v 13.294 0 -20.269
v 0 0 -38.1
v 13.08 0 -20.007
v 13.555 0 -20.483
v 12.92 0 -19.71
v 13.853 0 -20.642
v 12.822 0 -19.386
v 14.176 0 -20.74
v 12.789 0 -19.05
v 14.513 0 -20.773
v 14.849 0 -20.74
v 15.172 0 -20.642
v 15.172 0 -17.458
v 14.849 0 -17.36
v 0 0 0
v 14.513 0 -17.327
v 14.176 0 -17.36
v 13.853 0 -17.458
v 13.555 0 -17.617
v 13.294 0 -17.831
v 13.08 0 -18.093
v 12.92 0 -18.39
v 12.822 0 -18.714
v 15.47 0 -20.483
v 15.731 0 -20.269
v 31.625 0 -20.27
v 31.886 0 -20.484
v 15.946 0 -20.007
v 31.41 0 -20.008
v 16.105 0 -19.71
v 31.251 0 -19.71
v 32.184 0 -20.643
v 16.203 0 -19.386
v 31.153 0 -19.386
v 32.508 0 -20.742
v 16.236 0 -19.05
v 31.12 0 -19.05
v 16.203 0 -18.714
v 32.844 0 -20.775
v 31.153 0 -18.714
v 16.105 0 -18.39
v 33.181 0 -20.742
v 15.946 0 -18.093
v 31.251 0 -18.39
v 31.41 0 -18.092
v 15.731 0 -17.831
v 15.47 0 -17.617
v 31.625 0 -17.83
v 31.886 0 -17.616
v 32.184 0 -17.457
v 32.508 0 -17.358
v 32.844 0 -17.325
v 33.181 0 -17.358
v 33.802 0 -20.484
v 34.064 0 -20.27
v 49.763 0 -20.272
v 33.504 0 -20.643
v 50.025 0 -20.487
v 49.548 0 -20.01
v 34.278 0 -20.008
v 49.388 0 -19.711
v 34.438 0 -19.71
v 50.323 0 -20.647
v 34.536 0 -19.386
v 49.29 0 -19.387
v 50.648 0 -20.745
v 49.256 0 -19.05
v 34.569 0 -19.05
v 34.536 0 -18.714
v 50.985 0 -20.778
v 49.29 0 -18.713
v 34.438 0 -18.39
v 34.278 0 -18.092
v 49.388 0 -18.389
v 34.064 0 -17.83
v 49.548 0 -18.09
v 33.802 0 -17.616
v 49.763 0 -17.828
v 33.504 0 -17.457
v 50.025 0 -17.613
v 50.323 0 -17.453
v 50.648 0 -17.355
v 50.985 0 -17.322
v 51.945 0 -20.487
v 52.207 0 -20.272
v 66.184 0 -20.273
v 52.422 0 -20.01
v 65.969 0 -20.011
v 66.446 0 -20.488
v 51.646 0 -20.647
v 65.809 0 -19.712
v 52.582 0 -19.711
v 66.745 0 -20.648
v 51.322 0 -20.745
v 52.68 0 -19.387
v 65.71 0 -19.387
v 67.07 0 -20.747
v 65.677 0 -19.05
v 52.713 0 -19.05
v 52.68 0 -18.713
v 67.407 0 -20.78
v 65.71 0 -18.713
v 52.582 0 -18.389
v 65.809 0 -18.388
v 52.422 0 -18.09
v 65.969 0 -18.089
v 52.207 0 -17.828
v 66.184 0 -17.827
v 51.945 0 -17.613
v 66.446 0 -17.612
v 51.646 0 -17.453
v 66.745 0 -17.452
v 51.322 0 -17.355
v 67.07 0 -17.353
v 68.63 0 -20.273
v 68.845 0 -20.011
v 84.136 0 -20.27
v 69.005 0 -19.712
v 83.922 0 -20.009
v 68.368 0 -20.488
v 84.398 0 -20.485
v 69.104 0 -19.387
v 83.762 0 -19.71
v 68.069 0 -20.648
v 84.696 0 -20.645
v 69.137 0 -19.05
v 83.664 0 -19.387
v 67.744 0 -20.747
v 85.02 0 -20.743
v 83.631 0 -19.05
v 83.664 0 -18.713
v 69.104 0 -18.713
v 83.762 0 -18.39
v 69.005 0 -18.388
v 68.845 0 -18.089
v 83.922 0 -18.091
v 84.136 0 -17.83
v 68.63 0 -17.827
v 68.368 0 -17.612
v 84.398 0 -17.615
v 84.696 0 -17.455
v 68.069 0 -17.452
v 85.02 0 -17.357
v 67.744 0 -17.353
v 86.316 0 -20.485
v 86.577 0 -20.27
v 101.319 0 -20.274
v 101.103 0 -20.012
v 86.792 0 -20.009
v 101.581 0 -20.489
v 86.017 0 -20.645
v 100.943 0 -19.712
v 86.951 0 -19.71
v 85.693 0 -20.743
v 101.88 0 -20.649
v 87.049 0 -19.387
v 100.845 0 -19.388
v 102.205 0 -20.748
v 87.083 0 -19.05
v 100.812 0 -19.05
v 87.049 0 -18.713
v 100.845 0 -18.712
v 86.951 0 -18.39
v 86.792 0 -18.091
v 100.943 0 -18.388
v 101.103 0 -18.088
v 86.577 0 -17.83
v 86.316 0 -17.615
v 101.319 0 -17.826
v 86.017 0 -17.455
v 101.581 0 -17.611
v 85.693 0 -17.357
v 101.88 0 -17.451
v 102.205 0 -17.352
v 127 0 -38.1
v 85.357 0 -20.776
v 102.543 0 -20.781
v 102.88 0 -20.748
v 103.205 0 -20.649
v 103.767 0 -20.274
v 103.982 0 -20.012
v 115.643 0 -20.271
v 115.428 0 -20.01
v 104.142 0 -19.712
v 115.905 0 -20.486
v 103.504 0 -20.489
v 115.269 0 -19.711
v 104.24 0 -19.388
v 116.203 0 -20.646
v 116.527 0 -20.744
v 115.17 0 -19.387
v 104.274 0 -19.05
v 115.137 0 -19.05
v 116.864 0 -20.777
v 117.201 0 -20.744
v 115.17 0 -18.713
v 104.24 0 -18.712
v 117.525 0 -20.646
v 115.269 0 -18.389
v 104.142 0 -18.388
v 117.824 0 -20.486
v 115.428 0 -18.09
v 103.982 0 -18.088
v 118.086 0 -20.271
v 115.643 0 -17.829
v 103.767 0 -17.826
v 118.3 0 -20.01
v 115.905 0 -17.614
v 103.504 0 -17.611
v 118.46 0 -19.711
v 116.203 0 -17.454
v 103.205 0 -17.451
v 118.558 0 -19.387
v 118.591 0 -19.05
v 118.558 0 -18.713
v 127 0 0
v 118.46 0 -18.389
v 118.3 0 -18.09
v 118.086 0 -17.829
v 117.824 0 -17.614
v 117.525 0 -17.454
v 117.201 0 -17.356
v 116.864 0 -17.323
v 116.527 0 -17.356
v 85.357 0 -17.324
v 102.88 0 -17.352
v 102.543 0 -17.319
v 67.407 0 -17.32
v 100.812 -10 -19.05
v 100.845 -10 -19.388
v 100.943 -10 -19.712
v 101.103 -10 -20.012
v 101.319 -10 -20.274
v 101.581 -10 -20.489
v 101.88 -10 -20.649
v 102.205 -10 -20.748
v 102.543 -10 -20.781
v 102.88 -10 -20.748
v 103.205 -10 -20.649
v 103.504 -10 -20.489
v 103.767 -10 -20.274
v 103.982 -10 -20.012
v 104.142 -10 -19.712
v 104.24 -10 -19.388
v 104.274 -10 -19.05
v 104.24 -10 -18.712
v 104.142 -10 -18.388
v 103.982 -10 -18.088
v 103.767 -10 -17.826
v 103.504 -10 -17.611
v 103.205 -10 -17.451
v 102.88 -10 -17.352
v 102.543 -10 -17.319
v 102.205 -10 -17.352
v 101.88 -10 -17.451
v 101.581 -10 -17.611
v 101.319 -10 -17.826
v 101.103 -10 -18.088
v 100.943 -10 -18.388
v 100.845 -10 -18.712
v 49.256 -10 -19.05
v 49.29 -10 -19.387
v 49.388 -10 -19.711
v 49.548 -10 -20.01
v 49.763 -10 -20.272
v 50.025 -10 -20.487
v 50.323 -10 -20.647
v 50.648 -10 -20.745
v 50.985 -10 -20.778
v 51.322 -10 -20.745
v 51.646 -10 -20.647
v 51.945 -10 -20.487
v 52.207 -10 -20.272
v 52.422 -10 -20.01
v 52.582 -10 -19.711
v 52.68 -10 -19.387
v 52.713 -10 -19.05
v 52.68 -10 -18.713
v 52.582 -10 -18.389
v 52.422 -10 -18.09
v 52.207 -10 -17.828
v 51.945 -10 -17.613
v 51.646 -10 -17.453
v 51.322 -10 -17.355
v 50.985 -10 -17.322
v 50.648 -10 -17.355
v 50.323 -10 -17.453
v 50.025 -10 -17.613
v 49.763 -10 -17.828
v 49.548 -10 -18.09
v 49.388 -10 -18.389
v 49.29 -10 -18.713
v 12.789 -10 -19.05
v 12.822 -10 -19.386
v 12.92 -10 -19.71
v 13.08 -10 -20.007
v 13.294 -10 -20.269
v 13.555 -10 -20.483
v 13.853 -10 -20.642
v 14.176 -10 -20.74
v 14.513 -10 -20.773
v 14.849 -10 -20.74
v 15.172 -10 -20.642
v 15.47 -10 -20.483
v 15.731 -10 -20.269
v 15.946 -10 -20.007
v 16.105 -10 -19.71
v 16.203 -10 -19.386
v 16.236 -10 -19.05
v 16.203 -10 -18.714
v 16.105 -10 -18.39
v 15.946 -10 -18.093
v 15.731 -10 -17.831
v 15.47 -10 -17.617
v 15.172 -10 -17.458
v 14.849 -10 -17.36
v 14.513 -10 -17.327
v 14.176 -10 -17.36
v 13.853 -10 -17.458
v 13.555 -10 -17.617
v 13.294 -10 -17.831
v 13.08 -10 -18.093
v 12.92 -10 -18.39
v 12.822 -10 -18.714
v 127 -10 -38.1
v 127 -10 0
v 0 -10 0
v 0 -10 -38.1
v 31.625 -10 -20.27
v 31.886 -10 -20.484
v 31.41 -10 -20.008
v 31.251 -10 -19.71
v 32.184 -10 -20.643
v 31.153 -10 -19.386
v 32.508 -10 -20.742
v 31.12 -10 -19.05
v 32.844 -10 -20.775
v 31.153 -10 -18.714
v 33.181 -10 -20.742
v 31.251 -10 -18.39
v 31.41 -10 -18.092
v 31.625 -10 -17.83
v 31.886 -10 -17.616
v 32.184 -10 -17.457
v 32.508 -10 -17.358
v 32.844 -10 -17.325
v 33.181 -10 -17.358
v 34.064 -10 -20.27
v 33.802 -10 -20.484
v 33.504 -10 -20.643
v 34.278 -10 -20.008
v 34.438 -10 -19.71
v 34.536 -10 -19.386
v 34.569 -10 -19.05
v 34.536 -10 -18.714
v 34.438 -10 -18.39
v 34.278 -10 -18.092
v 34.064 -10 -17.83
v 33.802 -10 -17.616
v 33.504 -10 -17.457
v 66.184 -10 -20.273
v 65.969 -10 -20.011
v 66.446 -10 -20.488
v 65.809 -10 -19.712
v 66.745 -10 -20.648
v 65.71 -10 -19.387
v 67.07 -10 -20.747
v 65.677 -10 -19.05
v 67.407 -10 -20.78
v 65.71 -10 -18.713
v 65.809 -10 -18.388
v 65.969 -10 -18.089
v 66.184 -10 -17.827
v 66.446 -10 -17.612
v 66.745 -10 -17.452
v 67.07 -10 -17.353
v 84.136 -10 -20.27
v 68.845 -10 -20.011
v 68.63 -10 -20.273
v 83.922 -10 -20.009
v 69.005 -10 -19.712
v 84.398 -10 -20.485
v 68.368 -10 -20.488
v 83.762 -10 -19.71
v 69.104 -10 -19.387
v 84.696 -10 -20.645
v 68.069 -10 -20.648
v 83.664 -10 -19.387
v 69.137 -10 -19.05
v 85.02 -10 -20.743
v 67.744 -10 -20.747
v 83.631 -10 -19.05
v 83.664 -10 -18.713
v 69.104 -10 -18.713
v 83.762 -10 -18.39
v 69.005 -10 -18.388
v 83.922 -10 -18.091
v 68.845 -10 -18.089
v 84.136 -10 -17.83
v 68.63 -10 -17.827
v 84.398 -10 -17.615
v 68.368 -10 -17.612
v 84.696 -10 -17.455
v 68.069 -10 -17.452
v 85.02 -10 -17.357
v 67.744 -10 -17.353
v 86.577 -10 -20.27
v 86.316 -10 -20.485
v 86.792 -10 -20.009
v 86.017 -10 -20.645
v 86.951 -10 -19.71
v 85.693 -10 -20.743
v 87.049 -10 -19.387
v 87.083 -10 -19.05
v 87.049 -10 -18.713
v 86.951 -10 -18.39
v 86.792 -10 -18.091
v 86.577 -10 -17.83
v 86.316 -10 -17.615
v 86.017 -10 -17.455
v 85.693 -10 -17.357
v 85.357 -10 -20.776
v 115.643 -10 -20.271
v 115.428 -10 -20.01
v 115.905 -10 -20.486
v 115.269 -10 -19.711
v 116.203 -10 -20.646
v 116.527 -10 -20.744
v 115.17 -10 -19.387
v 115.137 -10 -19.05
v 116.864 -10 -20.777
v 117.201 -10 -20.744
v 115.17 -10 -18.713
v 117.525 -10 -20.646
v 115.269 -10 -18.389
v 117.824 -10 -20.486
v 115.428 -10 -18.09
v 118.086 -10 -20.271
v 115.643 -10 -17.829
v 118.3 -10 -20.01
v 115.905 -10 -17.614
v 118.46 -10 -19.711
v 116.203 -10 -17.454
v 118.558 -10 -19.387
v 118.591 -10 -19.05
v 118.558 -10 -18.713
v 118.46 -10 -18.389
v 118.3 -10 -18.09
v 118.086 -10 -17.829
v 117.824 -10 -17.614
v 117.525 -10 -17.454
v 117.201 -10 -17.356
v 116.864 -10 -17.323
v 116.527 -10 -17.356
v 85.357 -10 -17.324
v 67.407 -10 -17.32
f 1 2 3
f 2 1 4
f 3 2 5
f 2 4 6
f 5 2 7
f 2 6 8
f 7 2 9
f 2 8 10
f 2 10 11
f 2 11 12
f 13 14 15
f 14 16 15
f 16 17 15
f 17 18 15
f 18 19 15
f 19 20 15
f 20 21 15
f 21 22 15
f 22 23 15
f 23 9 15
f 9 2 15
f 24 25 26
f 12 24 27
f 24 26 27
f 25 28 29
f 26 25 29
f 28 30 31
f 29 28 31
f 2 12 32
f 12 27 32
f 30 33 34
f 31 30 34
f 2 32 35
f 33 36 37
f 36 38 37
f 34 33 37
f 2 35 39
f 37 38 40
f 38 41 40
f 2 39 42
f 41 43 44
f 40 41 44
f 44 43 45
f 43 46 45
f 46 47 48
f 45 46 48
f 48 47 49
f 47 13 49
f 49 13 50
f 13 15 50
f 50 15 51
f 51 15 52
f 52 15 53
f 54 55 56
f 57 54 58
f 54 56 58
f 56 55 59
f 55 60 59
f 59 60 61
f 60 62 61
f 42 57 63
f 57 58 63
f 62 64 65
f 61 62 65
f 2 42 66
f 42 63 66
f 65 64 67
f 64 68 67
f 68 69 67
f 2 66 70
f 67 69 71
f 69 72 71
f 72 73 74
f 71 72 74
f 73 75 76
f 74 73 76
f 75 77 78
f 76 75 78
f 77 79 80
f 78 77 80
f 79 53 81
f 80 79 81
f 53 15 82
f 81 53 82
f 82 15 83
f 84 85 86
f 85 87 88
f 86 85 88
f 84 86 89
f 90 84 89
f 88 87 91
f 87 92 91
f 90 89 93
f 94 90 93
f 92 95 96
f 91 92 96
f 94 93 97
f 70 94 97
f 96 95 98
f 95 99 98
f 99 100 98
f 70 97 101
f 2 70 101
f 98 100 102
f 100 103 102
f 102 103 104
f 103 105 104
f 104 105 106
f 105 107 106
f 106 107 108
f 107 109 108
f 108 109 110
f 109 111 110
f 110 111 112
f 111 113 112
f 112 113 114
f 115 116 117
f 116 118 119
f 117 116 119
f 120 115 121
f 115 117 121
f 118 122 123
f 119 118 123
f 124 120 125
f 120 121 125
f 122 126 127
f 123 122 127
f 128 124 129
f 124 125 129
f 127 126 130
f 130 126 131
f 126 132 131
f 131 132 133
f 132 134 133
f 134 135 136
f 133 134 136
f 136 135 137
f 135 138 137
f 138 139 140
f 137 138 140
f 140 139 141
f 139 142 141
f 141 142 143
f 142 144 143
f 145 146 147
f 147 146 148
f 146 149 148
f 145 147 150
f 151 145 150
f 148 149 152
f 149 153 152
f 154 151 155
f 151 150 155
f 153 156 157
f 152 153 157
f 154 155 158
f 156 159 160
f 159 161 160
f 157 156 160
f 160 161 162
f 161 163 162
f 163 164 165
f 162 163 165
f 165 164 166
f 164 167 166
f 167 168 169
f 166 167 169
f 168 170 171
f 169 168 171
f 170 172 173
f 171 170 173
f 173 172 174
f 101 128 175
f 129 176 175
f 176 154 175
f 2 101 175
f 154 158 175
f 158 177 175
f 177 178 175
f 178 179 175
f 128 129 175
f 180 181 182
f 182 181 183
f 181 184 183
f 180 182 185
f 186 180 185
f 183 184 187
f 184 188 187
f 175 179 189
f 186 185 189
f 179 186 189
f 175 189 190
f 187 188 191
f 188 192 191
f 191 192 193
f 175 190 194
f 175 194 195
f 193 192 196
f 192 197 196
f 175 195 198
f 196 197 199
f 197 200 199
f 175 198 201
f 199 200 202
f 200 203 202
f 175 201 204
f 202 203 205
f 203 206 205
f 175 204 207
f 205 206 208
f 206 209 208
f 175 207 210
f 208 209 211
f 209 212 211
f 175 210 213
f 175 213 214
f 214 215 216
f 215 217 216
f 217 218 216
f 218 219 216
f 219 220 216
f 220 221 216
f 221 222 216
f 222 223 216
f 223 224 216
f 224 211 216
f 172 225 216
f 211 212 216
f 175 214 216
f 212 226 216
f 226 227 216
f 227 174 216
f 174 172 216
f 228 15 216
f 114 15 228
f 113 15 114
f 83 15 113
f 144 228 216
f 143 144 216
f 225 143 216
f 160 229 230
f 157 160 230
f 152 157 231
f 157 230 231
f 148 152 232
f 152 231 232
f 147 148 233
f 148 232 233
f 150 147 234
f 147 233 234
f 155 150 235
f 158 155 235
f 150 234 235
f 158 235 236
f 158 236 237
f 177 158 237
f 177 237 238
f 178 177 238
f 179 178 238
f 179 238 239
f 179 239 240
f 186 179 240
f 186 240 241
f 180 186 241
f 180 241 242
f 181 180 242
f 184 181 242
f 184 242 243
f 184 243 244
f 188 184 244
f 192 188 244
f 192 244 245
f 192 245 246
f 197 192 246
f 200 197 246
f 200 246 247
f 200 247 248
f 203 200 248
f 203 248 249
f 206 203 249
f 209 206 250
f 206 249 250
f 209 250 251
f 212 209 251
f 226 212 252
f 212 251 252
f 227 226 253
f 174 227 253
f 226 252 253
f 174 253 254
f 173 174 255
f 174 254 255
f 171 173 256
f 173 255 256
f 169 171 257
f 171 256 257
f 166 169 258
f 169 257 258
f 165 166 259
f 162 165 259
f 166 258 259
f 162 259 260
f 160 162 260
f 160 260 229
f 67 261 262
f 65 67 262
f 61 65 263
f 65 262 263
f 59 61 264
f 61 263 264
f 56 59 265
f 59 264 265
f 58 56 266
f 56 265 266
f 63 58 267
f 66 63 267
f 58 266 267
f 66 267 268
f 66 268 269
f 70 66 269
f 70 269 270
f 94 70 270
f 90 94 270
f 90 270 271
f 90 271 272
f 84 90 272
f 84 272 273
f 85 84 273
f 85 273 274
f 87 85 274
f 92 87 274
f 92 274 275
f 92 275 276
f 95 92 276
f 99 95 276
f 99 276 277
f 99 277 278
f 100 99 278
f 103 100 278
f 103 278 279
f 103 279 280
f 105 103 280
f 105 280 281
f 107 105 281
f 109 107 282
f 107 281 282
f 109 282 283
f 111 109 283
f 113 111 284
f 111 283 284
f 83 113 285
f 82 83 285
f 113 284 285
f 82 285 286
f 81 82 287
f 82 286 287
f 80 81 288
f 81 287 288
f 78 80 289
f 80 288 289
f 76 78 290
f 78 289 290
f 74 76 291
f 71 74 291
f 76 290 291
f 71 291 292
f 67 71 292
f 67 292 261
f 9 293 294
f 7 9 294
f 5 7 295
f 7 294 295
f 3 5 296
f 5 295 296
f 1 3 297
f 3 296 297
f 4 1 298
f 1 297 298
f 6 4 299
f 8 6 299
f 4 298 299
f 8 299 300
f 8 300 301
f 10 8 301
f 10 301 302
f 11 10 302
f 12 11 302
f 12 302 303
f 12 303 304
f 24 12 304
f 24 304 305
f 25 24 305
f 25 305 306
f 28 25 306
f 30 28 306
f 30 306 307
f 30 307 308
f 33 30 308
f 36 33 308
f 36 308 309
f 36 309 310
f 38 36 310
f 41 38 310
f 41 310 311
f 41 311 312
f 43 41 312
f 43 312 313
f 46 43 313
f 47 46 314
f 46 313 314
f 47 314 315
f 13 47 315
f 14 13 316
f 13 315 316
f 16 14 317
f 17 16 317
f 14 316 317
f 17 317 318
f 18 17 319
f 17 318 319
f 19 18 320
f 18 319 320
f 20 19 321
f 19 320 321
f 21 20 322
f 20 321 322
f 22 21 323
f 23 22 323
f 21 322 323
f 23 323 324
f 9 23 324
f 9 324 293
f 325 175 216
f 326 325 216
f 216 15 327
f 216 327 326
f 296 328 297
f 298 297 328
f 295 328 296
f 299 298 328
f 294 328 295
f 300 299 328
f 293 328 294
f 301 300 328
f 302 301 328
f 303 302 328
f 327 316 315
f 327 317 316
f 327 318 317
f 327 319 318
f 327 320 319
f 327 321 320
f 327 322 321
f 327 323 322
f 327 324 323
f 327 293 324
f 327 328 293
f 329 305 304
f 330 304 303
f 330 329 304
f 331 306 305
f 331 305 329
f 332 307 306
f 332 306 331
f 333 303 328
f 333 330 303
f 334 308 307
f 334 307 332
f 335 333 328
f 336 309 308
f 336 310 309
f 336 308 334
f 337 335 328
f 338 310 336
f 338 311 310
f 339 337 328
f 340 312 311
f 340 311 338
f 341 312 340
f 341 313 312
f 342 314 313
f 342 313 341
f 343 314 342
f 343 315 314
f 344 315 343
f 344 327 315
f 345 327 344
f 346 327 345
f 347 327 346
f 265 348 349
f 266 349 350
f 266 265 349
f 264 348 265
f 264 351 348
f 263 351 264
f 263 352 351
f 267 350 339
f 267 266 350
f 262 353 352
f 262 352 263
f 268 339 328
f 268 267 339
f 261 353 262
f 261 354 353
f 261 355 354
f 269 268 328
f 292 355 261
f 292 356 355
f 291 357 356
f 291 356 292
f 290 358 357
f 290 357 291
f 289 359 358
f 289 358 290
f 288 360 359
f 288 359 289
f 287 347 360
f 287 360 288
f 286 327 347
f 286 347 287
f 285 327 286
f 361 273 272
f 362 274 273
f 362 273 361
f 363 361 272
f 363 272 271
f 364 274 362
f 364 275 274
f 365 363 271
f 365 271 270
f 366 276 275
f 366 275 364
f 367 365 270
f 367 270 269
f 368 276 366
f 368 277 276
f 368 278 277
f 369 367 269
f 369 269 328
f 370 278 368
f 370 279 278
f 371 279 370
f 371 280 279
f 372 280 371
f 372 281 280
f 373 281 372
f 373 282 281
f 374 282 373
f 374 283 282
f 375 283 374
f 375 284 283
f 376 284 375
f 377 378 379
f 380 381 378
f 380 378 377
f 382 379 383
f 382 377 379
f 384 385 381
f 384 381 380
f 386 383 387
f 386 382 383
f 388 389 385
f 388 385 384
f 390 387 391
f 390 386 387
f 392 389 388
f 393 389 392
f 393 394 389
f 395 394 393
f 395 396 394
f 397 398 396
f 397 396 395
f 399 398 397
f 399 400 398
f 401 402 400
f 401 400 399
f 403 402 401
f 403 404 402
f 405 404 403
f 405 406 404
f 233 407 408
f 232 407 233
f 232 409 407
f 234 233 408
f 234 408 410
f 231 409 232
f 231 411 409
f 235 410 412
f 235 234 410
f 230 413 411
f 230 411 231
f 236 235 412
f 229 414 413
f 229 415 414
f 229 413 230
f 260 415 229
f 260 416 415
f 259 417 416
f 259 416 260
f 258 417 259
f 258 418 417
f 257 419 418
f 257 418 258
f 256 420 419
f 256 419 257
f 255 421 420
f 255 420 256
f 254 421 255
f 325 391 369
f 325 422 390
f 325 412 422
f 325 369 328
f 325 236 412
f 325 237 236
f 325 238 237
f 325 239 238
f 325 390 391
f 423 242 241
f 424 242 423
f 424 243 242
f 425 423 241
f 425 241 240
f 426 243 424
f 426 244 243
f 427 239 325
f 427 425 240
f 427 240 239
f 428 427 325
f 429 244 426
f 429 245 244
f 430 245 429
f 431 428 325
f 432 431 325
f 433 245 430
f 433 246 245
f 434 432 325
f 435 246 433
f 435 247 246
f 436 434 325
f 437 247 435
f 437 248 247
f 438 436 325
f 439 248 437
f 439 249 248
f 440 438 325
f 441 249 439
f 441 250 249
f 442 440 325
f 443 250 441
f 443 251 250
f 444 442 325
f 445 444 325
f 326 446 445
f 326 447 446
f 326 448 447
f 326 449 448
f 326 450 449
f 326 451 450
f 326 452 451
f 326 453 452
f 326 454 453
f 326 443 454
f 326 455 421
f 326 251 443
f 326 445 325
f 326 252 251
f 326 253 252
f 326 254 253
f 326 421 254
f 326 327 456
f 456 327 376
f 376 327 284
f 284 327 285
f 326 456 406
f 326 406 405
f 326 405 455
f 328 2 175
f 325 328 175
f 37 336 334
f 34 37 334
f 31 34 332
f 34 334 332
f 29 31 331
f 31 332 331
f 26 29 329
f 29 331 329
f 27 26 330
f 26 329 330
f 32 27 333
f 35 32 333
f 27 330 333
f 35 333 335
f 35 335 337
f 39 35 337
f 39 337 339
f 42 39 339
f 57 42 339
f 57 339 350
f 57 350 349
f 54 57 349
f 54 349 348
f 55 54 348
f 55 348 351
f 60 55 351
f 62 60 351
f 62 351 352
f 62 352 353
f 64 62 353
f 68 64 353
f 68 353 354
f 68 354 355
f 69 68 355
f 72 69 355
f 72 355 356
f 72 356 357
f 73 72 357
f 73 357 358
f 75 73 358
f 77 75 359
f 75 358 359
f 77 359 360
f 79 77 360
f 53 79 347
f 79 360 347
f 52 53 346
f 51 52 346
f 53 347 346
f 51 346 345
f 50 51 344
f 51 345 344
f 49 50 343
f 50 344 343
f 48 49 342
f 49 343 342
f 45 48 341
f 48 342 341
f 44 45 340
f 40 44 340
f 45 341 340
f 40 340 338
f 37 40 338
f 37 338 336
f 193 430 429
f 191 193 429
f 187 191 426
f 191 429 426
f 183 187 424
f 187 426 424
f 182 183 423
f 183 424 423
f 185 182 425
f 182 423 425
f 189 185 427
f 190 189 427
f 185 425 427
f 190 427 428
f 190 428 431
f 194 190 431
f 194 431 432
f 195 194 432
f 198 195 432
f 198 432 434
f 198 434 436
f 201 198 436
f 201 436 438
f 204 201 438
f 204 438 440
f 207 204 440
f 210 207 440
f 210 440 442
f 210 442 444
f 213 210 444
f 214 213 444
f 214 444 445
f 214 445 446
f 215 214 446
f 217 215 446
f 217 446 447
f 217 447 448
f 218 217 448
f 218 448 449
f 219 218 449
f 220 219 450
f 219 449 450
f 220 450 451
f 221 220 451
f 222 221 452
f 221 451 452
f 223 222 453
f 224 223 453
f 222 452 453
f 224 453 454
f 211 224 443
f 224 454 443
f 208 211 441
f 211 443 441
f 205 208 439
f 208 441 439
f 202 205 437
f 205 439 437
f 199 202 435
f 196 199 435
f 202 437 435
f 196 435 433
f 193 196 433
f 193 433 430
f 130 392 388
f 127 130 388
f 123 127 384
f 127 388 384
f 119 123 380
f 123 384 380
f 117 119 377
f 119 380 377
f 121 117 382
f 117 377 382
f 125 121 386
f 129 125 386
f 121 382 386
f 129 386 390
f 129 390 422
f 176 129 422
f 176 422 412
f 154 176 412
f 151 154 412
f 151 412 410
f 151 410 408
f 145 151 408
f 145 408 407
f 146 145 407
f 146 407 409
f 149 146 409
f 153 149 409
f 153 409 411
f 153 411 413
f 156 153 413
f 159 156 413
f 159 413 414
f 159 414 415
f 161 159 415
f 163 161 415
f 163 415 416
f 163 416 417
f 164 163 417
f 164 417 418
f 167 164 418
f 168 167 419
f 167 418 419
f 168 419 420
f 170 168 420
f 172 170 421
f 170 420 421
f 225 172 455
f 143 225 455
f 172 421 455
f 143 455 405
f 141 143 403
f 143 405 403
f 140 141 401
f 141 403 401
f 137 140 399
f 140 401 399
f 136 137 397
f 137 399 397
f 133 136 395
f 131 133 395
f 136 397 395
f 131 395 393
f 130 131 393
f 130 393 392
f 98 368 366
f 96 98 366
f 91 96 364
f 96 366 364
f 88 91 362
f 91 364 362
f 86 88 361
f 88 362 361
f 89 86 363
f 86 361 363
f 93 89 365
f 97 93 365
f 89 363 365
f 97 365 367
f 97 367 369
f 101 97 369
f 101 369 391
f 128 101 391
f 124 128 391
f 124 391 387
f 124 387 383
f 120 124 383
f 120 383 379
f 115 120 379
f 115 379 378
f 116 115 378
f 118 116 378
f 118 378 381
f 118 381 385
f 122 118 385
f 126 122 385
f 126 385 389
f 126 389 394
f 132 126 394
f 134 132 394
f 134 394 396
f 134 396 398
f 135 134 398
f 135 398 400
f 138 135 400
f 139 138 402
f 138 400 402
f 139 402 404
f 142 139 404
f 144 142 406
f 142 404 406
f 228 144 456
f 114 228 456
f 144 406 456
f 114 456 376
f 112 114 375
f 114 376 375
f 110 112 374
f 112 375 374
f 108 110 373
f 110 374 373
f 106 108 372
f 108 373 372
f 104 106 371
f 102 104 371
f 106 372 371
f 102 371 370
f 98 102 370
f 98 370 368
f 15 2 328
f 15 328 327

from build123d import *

# Parameters (mm, degrees)
F0_W     = 127
F0_H     = 38.1
F1_DEPTH = 10
F3_D     = 3.44678
F4_D     = 3.44932
F5_D     = 3.45186
F6_D     = 3.4544
F7_D     = 3.45694
F8_D     = 3.45948
F9_D     = 3.46202


with BuildPart() as f1:
    # F0 (on Front) → F1 (new body)
    with BuildSketch(Plane.XZ):
        with Locations((63.5, -19.05)):
            Rectangle(F0_W, F0_H)
    extrude(amount=F1_DEPTH)

    # F3 (through all)
    with Locations(Plane(origin=(0, 0, 0), x_dir=(1, 0, 0), z_dir=(0, 1, 0))):
        with Locations((14.5125538111, 19.05)):
            Hole(F3_D / 2)

    # F4 (through all)
    with Locations(Plane(origin=(0, 0, 0), x_dir=(1, 0, 0), z_dir=(0, 1, 0))):
        with Locations((32.8442007303, 19.05)):
            Hole(F4_D / 2)

    # F5 (through all)
    with Locations(Plane(origin=(0, 0, 0), x_dir=(1, 0, 0), z_dir=(0, 1, 0))):
        with Locations((85.3567272425, 19.05)):
            Hole(F5_D / 2)

    # F6 (through all)
    with Locations(Plane(origin=(0, 0, 0), x_dir=(1, 0, 0), z_dir=(0, 1, 0))):
        with Locations((116.8642491102, 19.05)):
            Hole(F6_D / 2)

    # F7 (through all)
    with Locations(Plane(origin=(0, 0, 0), x_dir=(1, 0, 0), z_dir=(0, 1, 0))):
        with Locations((50.9848929942, 19.05)):
            Hole(F7_D / 2)

    # F8 (through all)
    with Locations(Plane(origin=(0, 0, 0), x_dir=(1, 0, 0), z_dir=(0, 1, 0))):
        with Locations((67.4069970846, 19.05)):
            Hole(F8_D / 2)

    # F9 (through all)
    with Locations(Plane(origin=(0, 0, 0), x_dir=(1, 0, 0), z_dir=(0, 1, 0))):
        with Locations((102.5426462293, 19.05)):
            Hole(F9_D / 2)


solid = f1.part
